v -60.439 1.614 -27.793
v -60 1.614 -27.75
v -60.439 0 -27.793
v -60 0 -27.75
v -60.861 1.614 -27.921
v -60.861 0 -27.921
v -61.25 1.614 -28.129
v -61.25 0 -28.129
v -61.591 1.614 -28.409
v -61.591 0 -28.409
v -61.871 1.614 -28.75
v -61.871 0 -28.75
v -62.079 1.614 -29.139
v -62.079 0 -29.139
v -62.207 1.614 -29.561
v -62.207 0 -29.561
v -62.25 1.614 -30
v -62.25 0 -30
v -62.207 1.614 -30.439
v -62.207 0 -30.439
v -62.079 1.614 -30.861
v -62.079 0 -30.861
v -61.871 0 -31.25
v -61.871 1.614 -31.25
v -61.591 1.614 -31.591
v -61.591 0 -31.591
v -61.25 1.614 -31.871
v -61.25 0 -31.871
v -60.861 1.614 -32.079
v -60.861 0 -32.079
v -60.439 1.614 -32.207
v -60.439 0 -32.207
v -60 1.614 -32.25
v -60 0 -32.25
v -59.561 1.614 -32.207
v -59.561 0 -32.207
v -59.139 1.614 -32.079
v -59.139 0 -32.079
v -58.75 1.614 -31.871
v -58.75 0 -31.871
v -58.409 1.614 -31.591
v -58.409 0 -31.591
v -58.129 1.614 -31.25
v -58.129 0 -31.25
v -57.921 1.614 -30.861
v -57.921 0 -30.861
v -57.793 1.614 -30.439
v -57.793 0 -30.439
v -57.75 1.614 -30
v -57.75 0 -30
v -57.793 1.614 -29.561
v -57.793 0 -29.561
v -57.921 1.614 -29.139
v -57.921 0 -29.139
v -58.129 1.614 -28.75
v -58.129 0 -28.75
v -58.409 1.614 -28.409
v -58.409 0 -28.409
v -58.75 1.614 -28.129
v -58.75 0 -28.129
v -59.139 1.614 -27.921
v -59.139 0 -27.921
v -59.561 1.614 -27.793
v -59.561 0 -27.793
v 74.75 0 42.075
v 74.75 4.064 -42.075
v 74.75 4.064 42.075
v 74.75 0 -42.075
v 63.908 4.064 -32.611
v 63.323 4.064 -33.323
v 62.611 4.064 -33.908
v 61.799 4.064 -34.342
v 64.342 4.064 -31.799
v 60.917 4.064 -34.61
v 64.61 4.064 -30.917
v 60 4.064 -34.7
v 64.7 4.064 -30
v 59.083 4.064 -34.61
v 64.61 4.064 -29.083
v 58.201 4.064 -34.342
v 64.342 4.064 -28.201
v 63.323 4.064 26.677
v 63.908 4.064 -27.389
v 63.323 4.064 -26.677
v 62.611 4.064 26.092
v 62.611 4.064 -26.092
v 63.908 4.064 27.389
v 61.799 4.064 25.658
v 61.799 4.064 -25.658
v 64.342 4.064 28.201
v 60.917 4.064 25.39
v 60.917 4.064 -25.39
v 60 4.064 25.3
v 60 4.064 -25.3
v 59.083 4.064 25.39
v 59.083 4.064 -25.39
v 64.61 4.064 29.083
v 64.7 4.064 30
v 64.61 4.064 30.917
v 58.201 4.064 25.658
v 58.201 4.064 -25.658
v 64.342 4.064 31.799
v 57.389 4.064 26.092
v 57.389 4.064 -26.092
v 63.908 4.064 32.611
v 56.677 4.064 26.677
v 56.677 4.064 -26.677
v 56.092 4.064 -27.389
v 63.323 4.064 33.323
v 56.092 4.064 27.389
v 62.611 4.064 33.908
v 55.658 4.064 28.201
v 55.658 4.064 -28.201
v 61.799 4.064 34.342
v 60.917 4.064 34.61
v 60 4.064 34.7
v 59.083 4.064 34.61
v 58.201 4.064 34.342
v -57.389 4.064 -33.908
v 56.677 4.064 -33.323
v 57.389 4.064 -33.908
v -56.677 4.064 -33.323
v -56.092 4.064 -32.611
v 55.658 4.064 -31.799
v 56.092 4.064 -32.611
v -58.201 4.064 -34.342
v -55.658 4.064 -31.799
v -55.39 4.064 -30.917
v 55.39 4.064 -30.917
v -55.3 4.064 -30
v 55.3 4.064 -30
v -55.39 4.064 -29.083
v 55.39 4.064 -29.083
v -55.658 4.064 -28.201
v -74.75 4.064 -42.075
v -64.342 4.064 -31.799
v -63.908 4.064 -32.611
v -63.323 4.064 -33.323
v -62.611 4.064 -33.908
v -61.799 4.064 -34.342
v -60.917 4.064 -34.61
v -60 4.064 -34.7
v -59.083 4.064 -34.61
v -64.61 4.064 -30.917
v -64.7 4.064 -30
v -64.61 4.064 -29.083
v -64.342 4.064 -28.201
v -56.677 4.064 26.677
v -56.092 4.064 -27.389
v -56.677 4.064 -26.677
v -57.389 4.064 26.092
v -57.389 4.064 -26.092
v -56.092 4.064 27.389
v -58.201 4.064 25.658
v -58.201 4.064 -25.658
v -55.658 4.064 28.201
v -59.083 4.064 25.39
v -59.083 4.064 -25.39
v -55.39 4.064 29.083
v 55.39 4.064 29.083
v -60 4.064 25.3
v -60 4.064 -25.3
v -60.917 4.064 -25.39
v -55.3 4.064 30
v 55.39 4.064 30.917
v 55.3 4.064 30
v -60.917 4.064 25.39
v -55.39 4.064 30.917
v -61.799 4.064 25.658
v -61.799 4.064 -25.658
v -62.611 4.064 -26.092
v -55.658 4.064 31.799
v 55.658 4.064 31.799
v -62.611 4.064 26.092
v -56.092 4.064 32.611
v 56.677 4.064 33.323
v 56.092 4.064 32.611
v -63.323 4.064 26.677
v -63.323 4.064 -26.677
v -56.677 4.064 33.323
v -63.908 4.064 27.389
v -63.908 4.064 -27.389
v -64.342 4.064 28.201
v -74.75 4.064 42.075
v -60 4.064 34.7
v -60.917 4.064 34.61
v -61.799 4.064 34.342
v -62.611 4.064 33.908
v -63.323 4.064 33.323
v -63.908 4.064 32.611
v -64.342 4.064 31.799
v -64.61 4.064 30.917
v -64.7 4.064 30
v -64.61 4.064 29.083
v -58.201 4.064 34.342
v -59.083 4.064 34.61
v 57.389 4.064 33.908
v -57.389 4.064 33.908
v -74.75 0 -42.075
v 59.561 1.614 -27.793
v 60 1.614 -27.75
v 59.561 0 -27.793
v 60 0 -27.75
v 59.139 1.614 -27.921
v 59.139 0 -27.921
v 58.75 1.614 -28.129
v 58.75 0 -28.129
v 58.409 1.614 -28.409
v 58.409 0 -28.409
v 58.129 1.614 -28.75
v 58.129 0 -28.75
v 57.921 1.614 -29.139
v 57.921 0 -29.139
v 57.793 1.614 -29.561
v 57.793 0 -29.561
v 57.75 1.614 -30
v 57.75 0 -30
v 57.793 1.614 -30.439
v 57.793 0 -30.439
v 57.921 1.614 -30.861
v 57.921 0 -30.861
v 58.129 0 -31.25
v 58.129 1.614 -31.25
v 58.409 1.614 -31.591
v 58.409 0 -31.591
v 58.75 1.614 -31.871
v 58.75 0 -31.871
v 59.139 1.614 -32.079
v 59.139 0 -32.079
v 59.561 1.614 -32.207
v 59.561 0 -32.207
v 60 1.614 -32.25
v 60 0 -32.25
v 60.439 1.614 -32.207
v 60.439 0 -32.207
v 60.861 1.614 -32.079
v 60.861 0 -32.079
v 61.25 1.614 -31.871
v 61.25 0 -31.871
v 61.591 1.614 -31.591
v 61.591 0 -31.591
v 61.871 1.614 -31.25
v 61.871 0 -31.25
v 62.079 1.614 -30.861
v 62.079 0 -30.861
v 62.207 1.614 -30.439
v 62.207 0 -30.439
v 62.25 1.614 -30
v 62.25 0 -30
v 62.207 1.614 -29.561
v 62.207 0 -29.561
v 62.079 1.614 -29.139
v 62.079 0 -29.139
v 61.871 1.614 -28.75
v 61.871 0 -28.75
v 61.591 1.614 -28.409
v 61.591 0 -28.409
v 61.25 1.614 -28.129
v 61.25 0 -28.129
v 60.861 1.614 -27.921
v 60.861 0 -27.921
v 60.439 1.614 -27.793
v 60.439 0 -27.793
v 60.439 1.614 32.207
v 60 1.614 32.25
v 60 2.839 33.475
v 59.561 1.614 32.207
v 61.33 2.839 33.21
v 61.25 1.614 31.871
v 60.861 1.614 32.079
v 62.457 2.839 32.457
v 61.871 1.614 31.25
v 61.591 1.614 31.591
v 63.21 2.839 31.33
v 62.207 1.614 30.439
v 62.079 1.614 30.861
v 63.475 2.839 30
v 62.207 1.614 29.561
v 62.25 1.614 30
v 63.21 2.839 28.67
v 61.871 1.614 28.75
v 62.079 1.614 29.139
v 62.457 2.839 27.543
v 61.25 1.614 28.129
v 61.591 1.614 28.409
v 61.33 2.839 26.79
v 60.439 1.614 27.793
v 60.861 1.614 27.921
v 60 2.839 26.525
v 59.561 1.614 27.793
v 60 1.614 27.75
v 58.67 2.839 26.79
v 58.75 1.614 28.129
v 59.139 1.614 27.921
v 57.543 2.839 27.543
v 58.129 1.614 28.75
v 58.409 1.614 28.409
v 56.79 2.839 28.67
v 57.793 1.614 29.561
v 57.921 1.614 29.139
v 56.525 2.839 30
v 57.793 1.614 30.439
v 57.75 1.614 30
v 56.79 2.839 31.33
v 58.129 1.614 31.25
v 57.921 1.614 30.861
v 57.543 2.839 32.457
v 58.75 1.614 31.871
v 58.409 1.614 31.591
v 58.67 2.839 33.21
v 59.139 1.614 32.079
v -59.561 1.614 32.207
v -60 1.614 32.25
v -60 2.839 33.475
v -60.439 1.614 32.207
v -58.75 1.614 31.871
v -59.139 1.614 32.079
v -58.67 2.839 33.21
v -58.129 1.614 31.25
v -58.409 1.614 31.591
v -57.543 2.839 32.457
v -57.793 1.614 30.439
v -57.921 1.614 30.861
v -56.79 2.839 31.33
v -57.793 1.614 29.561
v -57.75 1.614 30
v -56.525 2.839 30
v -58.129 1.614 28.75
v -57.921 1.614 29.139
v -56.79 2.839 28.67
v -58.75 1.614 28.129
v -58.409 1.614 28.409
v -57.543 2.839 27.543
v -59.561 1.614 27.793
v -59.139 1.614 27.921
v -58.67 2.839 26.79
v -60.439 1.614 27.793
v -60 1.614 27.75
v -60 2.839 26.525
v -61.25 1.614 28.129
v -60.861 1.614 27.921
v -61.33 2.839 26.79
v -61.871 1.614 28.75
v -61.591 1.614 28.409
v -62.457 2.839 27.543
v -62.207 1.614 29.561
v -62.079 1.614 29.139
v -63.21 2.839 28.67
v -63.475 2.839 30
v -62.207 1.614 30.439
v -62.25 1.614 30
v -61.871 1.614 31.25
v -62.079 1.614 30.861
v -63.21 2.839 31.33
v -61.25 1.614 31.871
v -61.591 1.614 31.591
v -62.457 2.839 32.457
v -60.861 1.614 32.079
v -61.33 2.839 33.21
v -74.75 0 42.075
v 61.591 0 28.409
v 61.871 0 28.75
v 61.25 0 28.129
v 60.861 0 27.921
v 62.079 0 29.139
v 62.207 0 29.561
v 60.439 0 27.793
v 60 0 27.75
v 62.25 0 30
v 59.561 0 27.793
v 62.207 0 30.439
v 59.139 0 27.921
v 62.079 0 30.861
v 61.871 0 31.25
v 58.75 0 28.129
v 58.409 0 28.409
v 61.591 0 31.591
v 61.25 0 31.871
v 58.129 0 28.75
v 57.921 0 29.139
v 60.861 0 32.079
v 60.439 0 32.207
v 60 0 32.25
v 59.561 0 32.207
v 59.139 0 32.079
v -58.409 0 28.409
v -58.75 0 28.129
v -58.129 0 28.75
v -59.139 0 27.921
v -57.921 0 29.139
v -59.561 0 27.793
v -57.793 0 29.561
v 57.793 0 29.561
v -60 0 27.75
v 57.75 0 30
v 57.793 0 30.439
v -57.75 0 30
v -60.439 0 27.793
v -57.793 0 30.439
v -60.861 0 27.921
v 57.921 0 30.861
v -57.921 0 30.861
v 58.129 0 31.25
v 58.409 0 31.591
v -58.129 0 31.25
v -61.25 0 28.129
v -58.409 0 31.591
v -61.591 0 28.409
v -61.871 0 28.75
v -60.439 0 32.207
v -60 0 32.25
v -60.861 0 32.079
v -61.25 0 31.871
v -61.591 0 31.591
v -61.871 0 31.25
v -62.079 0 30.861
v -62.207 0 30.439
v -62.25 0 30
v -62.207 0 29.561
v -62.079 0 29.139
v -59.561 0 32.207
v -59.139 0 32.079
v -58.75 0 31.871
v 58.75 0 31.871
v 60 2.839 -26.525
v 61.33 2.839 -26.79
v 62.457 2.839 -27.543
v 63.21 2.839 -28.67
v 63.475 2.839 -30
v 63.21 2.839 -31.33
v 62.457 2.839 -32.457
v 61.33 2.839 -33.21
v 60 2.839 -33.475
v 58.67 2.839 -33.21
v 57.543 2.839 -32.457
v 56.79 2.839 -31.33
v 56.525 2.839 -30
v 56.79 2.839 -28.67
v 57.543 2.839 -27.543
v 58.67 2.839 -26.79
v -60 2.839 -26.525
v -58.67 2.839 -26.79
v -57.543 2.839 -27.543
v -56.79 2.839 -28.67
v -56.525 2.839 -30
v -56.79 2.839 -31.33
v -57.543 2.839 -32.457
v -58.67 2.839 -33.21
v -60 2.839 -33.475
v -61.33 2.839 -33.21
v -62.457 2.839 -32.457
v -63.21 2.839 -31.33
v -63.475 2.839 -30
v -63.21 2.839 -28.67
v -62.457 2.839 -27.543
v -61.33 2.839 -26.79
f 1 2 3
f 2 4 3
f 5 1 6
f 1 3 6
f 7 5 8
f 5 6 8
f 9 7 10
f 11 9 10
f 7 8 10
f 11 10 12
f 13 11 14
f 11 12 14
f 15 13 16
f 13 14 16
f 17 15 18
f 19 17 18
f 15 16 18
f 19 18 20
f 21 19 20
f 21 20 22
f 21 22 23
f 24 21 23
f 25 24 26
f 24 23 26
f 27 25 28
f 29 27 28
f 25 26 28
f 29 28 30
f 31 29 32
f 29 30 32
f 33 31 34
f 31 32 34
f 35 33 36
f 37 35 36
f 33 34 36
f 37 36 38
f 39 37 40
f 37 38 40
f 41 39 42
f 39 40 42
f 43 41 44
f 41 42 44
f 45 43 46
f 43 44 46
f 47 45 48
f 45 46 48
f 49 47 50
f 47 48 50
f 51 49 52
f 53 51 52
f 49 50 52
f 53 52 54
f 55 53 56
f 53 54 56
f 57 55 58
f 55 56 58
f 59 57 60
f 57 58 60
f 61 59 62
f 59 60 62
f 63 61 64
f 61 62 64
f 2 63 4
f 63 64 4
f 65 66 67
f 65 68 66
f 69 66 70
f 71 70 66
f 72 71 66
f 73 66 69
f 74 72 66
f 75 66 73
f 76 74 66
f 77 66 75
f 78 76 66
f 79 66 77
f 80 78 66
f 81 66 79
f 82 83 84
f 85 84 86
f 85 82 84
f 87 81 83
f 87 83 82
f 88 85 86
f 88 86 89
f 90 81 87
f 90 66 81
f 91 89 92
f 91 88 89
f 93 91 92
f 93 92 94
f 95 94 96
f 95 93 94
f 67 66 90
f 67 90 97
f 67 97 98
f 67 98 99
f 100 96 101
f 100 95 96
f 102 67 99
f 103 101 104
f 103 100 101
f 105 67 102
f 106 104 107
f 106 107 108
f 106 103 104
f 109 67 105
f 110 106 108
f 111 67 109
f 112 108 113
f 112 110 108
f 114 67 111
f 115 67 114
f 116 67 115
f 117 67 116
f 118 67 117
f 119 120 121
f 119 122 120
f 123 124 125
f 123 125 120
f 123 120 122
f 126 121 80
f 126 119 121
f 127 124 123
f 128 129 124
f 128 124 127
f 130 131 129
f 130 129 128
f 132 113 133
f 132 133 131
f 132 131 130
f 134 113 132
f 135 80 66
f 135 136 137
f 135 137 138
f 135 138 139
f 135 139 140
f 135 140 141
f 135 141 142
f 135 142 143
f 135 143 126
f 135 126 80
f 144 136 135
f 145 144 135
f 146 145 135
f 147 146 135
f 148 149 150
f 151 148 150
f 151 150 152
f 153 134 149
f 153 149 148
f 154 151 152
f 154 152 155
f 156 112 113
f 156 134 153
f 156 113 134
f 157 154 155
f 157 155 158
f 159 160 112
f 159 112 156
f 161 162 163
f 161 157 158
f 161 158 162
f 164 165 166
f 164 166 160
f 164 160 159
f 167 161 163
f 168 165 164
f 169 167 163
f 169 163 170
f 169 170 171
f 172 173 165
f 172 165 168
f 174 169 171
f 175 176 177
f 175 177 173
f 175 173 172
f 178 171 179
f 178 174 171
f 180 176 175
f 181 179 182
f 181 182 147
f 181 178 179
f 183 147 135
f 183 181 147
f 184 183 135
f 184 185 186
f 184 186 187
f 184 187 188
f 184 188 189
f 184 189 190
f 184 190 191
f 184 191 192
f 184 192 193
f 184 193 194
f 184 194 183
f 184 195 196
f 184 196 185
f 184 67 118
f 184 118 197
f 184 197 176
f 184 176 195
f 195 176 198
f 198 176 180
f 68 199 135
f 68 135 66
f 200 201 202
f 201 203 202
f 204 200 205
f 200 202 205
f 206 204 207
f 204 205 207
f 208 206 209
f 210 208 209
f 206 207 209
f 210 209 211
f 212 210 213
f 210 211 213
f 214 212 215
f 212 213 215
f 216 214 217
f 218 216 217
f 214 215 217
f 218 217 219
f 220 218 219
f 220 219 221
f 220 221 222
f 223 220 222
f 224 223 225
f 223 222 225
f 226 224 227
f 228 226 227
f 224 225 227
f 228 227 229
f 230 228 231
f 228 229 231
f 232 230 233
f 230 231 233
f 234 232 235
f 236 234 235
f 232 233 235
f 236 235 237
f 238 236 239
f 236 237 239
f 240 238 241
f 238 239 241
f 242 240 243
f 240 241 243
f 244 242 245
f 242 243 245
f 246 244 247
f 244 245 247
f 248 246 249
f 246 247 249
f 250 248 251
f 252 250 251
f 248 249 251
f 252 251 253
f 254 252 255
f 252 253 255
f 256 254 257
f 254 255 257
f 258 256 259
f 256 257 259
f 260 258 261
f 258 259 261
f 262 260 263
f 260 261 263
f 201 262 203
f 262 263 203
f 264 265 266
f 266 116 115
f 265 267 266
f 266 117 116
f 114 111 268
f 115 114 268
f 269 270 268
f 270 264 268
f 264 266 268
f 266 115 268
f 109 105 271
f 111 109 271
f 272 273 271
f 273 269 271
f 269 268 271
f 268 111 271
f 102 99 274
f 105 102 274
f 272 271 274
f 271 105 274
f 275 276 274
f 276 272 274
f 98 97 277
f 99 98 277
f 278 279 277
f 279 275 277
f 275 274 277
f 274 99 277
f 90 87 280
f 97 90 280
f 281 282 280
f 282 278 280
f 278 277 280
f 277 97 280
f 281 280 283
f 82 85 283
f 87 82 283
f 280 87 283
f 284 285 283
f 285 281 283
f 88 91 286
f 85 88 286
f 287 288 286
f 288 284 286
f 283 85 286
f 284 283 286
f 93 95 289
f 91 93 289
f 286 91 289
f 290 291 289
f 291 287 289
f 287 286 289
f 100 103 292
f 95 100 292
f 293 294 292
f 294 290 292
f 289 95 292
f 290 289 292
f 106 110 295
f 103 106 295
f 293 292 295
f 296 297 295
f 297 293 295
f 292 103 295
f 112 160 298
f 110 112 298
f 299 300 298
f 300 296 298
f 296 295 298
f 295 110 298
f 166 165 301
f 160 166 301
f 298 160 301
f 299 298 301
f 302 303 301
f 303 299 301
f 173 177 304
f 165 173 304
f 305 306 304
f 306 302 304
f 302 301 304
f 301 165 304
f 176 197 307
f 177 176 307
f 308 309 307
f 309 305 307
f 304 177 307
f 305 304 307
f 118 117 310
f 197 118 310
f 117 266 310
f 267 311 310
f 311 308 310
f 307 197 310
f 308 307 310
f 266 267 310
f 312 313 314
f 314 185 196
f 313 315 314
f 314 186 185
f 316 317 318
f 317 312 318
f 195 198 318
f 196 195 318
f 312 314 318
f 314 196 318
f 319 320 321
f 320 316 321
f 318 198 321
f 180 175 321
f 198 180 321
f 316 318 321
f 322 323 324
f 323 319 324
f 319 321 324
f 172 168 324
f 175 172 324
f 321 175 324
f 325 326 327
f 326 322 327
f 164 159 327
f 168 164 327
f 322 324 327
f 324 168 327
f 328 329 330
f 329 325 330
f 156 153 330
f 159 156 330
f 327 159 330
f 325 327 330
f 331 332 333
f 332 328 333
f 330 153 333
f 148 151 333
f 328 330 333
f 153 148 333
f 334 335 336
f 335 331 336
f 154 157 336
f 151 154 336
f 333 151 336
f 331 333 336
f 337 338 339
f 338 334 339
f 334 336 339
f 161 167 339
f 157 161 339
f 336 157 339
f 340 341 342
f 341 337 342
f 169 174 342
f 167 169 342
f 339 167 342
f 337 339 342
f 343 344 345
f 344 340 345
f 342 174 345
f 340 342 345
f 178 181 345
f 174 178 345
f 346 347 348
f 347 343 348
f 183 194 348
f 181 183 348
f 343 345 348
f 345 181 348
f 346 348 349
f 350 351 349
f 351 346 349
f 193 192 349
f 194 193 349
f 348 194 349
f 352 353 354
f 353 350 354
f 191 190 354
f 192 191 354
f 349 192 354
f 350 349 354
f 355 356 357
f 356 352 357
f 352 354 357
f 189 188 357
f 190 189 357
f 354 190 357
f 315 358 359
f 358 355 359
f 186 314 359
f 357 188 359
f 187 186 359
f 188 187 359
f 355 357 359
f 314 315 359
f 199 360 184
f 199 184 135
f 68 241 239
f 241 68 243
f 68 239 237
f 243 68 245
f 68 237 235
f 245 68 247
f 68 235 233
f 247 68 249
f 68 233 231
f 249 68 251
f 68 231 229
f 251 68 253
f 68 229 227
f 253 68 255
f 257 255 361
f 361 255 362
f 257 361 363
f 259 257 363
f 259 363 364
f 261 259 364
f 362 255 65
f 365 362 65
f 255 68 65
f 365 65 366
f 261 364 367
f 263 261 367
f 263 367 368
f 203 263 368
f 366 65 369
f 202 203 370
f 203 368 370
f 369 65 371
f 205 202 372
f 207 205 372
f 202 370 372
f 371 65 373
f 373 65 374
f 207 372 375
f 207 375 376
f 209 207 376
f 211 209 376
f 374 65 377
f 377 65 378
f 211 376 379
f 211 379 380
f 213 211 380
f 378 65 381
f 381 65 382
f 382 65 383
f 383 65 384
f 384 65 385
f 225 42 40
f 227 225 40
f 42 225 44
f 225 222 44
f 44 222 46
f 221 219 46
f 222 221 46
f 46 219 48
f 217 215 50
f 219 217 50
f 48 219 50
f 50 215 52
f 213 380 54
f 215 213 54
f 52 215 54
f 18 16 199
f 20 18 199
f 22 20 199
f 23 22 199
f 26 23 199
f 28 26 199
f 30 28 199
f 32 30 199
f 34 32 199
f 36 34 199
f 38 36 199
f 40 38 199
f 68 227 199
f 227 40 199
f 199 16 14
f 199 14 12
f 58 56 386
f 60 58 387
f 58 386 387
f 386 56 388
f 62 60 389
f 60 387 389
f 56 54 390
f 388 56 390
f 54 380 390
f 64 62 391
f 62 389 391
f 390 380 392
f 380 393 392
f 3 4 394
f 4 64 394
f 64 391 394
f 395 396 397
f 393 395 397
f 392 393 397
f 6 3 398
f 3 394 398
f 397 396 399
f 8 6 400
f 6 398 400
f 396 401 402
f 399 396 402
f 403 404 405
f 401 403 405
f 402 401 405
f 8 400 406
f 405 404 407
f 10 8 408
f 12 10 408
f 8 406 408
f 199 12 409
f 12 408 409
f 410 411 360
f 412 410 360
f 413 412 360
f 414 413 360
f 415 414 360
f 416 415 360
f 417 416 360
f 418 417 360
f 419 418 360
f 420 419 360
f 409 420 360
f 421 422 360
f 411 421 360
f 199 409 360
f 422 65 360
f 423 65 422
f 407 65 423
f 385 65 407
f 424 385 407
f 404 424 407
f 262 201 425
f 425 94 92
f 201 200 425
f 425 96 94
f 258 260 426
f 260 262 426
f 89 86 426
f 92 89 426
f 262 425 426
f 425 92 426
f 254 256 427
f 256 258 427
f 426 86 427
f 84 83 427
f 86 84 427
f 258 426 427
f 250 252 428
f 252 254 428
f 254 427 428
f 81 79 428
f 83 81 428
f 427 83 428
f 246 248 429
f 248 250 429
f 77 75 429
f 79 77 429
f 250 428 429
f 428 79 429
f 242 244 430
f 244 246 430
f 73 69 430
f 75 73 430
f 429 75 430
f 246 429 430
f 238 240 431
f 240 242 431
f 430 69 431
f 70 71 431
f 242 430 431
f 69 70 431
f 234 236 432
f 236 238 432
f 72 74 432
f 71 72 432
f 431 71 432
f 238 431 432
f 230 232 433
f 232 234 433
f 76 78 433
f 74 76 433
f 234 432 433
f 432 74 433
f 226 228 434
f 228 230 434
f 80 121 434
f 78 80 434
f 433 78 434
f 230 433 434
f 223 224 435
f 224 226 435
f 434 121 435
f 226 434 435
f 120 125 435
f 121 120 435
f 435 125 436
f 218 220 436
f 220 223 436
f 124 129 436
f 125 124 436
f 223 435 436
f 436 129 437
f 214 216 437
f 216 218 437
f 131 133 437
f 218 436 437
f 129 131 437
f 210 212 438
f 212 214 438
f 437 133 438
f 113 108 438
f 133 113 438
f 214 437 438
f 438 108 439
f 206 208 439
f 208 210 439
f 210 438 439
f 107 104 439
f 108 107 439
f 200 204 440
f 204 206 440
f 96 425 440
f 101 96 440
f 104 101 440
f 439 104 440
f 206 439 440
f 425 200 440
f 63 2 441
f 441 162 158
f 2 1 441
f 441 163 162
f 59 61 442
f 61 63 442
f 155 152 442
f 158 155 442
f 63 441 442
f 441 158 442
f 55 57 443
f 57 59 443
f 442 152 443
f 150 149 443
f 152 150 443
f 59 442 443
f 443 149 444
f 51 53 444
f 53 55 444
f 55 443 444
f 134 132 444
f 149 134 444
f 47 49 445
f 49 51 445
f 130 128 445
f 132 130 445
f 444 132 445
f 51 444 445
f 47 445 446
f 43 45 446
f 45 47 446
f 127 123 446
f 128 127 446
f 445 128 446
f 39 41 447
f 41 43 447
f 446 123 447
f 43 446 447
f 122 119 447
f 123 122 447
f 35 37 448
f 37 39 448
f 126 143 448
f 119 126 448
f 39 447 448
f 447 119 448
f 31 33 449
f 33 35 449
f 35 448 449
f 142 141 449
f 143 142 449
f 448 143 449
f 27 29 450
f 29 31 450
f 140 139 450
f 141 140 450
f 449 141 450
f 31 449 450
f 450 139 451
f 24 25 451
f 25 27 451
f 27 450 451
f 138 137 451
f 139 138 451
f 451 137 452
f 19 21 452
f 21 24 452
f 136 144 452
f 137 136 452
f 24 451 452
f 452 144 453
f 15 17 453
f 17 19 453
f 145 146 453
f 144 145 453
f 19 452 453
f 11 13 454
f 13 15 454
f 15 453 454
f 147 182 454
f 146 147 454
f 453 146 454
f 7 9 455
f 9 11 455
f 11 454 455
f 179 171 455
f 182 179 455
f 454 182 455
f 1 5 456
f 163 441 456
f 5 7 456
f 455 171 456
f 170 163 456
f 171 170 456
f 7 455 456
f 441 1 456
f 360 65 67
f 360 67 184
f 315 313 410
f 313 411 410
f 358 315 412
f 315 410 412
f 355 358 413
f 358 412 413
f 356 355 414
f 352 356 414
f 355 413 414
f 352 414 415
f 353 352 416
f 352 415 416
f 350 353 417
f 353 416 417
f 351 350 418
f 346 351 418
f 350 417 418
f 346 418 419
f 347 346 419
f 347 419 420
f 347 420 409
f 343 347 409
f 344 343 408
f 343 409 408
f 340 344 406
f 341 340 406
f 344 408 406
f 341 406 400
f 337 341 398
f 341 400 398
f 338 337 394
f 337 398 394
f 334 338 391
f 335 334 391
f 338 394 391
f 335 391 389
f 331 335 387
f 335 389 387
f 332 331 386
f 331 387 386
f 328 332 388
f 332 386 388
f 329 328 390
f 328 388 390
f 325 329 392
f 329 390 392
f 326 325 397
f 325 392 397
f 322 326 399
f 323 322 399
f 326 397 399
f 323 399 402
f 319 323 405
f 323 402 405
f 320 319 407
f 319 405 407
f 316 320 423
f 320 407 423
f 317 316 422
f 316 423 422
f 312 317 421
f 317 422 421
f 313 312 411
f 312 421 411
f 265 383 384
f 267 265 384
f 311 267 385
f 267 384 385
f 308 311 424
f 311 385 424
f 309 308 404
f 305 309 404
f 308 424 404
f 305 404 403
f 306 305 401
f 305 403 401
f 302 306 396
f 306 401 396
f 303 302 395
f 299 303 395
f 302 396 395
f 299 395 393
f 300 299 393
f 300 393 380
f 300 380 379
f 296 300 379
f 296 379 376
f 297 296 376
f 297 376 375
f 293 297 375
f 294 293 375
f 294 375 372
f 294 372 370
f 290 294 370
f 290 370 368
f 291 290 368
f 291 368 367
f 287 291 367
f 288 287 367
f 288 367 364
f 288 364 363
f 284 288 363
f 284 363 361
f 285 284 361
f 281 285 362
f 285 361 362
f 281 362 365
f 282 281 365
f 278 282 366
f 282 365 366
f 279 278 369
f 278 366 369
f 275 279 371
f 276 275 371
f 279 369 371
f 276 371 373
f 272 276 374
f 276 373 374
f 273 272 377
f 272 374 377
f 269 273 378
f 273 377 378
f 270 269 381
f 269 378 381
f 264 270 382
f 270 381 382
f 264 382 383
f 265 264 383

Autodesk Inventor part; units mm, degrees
ref_plane "YZ Plane" through (0, 0, 0) normal (1, 0, 0) x (0, 1, 0)
ref_plane "XZ Plane" through (0, 0, 0) normal (0, 1, 0) x (-1, 0, 0)
ref_plane "XY Plane" through (0, 0, 0) normal (0, 0, 1) x (1, 0, 0)
sketch "Sketch1" plane through (0, 0, 0) normal (0, 1, 0) x (-1, 0, 0)
  line L0 (-74.75, 42.075) -> (74.75, 42.075)
  line L1 (74.75, 42.075) -> (74.75, -42.075)
  line L2 (74.75, -42.075) -> (-74.75, -42.075)
  line L3 (-74.75, -42.075) -> (-74.75, 42.075)
  line L4 (-74.75, 42.075) -> (74.75, -42.075) construction
  line L5 (74.75, 42.075) -> (-74.75, -42.075) construction
  point P0 (0, 0)
  dimension "d0" = 149.5
  dimension "d1" = 84.15
extrude "Extrusion1" add sketch "Sketch1" along normal blind 4.064
sketch "Sketch2" plane through (0, 4.064, 0) normal (0, 1, 0) x (1, 0, 0)
  point P0 (0, 0)
  point P1 (-60, 30)
  point P2 (60, 30)
  point P3 (-60, -30)
  point P4 (60, -30)
  dimension "d4" = 60
  dimension "d5" = 30
  dimension "d6" = 60
  dimension "d7" = 30
  dimension "d8" = 30
  dimension "d9" = 60
  dimension "d10" = 30
  dimension "d11" = 60
hole "Hole1" at (-60, 4.064, -30) at (60, 4.064, -30) at (-60, 4.064, 30) at (60, 4.064, 30) direction (0, -1, 0) diameter 4.5 end through all countersink diameter 9.4 countersink angle 90
properties part number "Piston Feed Surface" material "Aluminum 6061"
